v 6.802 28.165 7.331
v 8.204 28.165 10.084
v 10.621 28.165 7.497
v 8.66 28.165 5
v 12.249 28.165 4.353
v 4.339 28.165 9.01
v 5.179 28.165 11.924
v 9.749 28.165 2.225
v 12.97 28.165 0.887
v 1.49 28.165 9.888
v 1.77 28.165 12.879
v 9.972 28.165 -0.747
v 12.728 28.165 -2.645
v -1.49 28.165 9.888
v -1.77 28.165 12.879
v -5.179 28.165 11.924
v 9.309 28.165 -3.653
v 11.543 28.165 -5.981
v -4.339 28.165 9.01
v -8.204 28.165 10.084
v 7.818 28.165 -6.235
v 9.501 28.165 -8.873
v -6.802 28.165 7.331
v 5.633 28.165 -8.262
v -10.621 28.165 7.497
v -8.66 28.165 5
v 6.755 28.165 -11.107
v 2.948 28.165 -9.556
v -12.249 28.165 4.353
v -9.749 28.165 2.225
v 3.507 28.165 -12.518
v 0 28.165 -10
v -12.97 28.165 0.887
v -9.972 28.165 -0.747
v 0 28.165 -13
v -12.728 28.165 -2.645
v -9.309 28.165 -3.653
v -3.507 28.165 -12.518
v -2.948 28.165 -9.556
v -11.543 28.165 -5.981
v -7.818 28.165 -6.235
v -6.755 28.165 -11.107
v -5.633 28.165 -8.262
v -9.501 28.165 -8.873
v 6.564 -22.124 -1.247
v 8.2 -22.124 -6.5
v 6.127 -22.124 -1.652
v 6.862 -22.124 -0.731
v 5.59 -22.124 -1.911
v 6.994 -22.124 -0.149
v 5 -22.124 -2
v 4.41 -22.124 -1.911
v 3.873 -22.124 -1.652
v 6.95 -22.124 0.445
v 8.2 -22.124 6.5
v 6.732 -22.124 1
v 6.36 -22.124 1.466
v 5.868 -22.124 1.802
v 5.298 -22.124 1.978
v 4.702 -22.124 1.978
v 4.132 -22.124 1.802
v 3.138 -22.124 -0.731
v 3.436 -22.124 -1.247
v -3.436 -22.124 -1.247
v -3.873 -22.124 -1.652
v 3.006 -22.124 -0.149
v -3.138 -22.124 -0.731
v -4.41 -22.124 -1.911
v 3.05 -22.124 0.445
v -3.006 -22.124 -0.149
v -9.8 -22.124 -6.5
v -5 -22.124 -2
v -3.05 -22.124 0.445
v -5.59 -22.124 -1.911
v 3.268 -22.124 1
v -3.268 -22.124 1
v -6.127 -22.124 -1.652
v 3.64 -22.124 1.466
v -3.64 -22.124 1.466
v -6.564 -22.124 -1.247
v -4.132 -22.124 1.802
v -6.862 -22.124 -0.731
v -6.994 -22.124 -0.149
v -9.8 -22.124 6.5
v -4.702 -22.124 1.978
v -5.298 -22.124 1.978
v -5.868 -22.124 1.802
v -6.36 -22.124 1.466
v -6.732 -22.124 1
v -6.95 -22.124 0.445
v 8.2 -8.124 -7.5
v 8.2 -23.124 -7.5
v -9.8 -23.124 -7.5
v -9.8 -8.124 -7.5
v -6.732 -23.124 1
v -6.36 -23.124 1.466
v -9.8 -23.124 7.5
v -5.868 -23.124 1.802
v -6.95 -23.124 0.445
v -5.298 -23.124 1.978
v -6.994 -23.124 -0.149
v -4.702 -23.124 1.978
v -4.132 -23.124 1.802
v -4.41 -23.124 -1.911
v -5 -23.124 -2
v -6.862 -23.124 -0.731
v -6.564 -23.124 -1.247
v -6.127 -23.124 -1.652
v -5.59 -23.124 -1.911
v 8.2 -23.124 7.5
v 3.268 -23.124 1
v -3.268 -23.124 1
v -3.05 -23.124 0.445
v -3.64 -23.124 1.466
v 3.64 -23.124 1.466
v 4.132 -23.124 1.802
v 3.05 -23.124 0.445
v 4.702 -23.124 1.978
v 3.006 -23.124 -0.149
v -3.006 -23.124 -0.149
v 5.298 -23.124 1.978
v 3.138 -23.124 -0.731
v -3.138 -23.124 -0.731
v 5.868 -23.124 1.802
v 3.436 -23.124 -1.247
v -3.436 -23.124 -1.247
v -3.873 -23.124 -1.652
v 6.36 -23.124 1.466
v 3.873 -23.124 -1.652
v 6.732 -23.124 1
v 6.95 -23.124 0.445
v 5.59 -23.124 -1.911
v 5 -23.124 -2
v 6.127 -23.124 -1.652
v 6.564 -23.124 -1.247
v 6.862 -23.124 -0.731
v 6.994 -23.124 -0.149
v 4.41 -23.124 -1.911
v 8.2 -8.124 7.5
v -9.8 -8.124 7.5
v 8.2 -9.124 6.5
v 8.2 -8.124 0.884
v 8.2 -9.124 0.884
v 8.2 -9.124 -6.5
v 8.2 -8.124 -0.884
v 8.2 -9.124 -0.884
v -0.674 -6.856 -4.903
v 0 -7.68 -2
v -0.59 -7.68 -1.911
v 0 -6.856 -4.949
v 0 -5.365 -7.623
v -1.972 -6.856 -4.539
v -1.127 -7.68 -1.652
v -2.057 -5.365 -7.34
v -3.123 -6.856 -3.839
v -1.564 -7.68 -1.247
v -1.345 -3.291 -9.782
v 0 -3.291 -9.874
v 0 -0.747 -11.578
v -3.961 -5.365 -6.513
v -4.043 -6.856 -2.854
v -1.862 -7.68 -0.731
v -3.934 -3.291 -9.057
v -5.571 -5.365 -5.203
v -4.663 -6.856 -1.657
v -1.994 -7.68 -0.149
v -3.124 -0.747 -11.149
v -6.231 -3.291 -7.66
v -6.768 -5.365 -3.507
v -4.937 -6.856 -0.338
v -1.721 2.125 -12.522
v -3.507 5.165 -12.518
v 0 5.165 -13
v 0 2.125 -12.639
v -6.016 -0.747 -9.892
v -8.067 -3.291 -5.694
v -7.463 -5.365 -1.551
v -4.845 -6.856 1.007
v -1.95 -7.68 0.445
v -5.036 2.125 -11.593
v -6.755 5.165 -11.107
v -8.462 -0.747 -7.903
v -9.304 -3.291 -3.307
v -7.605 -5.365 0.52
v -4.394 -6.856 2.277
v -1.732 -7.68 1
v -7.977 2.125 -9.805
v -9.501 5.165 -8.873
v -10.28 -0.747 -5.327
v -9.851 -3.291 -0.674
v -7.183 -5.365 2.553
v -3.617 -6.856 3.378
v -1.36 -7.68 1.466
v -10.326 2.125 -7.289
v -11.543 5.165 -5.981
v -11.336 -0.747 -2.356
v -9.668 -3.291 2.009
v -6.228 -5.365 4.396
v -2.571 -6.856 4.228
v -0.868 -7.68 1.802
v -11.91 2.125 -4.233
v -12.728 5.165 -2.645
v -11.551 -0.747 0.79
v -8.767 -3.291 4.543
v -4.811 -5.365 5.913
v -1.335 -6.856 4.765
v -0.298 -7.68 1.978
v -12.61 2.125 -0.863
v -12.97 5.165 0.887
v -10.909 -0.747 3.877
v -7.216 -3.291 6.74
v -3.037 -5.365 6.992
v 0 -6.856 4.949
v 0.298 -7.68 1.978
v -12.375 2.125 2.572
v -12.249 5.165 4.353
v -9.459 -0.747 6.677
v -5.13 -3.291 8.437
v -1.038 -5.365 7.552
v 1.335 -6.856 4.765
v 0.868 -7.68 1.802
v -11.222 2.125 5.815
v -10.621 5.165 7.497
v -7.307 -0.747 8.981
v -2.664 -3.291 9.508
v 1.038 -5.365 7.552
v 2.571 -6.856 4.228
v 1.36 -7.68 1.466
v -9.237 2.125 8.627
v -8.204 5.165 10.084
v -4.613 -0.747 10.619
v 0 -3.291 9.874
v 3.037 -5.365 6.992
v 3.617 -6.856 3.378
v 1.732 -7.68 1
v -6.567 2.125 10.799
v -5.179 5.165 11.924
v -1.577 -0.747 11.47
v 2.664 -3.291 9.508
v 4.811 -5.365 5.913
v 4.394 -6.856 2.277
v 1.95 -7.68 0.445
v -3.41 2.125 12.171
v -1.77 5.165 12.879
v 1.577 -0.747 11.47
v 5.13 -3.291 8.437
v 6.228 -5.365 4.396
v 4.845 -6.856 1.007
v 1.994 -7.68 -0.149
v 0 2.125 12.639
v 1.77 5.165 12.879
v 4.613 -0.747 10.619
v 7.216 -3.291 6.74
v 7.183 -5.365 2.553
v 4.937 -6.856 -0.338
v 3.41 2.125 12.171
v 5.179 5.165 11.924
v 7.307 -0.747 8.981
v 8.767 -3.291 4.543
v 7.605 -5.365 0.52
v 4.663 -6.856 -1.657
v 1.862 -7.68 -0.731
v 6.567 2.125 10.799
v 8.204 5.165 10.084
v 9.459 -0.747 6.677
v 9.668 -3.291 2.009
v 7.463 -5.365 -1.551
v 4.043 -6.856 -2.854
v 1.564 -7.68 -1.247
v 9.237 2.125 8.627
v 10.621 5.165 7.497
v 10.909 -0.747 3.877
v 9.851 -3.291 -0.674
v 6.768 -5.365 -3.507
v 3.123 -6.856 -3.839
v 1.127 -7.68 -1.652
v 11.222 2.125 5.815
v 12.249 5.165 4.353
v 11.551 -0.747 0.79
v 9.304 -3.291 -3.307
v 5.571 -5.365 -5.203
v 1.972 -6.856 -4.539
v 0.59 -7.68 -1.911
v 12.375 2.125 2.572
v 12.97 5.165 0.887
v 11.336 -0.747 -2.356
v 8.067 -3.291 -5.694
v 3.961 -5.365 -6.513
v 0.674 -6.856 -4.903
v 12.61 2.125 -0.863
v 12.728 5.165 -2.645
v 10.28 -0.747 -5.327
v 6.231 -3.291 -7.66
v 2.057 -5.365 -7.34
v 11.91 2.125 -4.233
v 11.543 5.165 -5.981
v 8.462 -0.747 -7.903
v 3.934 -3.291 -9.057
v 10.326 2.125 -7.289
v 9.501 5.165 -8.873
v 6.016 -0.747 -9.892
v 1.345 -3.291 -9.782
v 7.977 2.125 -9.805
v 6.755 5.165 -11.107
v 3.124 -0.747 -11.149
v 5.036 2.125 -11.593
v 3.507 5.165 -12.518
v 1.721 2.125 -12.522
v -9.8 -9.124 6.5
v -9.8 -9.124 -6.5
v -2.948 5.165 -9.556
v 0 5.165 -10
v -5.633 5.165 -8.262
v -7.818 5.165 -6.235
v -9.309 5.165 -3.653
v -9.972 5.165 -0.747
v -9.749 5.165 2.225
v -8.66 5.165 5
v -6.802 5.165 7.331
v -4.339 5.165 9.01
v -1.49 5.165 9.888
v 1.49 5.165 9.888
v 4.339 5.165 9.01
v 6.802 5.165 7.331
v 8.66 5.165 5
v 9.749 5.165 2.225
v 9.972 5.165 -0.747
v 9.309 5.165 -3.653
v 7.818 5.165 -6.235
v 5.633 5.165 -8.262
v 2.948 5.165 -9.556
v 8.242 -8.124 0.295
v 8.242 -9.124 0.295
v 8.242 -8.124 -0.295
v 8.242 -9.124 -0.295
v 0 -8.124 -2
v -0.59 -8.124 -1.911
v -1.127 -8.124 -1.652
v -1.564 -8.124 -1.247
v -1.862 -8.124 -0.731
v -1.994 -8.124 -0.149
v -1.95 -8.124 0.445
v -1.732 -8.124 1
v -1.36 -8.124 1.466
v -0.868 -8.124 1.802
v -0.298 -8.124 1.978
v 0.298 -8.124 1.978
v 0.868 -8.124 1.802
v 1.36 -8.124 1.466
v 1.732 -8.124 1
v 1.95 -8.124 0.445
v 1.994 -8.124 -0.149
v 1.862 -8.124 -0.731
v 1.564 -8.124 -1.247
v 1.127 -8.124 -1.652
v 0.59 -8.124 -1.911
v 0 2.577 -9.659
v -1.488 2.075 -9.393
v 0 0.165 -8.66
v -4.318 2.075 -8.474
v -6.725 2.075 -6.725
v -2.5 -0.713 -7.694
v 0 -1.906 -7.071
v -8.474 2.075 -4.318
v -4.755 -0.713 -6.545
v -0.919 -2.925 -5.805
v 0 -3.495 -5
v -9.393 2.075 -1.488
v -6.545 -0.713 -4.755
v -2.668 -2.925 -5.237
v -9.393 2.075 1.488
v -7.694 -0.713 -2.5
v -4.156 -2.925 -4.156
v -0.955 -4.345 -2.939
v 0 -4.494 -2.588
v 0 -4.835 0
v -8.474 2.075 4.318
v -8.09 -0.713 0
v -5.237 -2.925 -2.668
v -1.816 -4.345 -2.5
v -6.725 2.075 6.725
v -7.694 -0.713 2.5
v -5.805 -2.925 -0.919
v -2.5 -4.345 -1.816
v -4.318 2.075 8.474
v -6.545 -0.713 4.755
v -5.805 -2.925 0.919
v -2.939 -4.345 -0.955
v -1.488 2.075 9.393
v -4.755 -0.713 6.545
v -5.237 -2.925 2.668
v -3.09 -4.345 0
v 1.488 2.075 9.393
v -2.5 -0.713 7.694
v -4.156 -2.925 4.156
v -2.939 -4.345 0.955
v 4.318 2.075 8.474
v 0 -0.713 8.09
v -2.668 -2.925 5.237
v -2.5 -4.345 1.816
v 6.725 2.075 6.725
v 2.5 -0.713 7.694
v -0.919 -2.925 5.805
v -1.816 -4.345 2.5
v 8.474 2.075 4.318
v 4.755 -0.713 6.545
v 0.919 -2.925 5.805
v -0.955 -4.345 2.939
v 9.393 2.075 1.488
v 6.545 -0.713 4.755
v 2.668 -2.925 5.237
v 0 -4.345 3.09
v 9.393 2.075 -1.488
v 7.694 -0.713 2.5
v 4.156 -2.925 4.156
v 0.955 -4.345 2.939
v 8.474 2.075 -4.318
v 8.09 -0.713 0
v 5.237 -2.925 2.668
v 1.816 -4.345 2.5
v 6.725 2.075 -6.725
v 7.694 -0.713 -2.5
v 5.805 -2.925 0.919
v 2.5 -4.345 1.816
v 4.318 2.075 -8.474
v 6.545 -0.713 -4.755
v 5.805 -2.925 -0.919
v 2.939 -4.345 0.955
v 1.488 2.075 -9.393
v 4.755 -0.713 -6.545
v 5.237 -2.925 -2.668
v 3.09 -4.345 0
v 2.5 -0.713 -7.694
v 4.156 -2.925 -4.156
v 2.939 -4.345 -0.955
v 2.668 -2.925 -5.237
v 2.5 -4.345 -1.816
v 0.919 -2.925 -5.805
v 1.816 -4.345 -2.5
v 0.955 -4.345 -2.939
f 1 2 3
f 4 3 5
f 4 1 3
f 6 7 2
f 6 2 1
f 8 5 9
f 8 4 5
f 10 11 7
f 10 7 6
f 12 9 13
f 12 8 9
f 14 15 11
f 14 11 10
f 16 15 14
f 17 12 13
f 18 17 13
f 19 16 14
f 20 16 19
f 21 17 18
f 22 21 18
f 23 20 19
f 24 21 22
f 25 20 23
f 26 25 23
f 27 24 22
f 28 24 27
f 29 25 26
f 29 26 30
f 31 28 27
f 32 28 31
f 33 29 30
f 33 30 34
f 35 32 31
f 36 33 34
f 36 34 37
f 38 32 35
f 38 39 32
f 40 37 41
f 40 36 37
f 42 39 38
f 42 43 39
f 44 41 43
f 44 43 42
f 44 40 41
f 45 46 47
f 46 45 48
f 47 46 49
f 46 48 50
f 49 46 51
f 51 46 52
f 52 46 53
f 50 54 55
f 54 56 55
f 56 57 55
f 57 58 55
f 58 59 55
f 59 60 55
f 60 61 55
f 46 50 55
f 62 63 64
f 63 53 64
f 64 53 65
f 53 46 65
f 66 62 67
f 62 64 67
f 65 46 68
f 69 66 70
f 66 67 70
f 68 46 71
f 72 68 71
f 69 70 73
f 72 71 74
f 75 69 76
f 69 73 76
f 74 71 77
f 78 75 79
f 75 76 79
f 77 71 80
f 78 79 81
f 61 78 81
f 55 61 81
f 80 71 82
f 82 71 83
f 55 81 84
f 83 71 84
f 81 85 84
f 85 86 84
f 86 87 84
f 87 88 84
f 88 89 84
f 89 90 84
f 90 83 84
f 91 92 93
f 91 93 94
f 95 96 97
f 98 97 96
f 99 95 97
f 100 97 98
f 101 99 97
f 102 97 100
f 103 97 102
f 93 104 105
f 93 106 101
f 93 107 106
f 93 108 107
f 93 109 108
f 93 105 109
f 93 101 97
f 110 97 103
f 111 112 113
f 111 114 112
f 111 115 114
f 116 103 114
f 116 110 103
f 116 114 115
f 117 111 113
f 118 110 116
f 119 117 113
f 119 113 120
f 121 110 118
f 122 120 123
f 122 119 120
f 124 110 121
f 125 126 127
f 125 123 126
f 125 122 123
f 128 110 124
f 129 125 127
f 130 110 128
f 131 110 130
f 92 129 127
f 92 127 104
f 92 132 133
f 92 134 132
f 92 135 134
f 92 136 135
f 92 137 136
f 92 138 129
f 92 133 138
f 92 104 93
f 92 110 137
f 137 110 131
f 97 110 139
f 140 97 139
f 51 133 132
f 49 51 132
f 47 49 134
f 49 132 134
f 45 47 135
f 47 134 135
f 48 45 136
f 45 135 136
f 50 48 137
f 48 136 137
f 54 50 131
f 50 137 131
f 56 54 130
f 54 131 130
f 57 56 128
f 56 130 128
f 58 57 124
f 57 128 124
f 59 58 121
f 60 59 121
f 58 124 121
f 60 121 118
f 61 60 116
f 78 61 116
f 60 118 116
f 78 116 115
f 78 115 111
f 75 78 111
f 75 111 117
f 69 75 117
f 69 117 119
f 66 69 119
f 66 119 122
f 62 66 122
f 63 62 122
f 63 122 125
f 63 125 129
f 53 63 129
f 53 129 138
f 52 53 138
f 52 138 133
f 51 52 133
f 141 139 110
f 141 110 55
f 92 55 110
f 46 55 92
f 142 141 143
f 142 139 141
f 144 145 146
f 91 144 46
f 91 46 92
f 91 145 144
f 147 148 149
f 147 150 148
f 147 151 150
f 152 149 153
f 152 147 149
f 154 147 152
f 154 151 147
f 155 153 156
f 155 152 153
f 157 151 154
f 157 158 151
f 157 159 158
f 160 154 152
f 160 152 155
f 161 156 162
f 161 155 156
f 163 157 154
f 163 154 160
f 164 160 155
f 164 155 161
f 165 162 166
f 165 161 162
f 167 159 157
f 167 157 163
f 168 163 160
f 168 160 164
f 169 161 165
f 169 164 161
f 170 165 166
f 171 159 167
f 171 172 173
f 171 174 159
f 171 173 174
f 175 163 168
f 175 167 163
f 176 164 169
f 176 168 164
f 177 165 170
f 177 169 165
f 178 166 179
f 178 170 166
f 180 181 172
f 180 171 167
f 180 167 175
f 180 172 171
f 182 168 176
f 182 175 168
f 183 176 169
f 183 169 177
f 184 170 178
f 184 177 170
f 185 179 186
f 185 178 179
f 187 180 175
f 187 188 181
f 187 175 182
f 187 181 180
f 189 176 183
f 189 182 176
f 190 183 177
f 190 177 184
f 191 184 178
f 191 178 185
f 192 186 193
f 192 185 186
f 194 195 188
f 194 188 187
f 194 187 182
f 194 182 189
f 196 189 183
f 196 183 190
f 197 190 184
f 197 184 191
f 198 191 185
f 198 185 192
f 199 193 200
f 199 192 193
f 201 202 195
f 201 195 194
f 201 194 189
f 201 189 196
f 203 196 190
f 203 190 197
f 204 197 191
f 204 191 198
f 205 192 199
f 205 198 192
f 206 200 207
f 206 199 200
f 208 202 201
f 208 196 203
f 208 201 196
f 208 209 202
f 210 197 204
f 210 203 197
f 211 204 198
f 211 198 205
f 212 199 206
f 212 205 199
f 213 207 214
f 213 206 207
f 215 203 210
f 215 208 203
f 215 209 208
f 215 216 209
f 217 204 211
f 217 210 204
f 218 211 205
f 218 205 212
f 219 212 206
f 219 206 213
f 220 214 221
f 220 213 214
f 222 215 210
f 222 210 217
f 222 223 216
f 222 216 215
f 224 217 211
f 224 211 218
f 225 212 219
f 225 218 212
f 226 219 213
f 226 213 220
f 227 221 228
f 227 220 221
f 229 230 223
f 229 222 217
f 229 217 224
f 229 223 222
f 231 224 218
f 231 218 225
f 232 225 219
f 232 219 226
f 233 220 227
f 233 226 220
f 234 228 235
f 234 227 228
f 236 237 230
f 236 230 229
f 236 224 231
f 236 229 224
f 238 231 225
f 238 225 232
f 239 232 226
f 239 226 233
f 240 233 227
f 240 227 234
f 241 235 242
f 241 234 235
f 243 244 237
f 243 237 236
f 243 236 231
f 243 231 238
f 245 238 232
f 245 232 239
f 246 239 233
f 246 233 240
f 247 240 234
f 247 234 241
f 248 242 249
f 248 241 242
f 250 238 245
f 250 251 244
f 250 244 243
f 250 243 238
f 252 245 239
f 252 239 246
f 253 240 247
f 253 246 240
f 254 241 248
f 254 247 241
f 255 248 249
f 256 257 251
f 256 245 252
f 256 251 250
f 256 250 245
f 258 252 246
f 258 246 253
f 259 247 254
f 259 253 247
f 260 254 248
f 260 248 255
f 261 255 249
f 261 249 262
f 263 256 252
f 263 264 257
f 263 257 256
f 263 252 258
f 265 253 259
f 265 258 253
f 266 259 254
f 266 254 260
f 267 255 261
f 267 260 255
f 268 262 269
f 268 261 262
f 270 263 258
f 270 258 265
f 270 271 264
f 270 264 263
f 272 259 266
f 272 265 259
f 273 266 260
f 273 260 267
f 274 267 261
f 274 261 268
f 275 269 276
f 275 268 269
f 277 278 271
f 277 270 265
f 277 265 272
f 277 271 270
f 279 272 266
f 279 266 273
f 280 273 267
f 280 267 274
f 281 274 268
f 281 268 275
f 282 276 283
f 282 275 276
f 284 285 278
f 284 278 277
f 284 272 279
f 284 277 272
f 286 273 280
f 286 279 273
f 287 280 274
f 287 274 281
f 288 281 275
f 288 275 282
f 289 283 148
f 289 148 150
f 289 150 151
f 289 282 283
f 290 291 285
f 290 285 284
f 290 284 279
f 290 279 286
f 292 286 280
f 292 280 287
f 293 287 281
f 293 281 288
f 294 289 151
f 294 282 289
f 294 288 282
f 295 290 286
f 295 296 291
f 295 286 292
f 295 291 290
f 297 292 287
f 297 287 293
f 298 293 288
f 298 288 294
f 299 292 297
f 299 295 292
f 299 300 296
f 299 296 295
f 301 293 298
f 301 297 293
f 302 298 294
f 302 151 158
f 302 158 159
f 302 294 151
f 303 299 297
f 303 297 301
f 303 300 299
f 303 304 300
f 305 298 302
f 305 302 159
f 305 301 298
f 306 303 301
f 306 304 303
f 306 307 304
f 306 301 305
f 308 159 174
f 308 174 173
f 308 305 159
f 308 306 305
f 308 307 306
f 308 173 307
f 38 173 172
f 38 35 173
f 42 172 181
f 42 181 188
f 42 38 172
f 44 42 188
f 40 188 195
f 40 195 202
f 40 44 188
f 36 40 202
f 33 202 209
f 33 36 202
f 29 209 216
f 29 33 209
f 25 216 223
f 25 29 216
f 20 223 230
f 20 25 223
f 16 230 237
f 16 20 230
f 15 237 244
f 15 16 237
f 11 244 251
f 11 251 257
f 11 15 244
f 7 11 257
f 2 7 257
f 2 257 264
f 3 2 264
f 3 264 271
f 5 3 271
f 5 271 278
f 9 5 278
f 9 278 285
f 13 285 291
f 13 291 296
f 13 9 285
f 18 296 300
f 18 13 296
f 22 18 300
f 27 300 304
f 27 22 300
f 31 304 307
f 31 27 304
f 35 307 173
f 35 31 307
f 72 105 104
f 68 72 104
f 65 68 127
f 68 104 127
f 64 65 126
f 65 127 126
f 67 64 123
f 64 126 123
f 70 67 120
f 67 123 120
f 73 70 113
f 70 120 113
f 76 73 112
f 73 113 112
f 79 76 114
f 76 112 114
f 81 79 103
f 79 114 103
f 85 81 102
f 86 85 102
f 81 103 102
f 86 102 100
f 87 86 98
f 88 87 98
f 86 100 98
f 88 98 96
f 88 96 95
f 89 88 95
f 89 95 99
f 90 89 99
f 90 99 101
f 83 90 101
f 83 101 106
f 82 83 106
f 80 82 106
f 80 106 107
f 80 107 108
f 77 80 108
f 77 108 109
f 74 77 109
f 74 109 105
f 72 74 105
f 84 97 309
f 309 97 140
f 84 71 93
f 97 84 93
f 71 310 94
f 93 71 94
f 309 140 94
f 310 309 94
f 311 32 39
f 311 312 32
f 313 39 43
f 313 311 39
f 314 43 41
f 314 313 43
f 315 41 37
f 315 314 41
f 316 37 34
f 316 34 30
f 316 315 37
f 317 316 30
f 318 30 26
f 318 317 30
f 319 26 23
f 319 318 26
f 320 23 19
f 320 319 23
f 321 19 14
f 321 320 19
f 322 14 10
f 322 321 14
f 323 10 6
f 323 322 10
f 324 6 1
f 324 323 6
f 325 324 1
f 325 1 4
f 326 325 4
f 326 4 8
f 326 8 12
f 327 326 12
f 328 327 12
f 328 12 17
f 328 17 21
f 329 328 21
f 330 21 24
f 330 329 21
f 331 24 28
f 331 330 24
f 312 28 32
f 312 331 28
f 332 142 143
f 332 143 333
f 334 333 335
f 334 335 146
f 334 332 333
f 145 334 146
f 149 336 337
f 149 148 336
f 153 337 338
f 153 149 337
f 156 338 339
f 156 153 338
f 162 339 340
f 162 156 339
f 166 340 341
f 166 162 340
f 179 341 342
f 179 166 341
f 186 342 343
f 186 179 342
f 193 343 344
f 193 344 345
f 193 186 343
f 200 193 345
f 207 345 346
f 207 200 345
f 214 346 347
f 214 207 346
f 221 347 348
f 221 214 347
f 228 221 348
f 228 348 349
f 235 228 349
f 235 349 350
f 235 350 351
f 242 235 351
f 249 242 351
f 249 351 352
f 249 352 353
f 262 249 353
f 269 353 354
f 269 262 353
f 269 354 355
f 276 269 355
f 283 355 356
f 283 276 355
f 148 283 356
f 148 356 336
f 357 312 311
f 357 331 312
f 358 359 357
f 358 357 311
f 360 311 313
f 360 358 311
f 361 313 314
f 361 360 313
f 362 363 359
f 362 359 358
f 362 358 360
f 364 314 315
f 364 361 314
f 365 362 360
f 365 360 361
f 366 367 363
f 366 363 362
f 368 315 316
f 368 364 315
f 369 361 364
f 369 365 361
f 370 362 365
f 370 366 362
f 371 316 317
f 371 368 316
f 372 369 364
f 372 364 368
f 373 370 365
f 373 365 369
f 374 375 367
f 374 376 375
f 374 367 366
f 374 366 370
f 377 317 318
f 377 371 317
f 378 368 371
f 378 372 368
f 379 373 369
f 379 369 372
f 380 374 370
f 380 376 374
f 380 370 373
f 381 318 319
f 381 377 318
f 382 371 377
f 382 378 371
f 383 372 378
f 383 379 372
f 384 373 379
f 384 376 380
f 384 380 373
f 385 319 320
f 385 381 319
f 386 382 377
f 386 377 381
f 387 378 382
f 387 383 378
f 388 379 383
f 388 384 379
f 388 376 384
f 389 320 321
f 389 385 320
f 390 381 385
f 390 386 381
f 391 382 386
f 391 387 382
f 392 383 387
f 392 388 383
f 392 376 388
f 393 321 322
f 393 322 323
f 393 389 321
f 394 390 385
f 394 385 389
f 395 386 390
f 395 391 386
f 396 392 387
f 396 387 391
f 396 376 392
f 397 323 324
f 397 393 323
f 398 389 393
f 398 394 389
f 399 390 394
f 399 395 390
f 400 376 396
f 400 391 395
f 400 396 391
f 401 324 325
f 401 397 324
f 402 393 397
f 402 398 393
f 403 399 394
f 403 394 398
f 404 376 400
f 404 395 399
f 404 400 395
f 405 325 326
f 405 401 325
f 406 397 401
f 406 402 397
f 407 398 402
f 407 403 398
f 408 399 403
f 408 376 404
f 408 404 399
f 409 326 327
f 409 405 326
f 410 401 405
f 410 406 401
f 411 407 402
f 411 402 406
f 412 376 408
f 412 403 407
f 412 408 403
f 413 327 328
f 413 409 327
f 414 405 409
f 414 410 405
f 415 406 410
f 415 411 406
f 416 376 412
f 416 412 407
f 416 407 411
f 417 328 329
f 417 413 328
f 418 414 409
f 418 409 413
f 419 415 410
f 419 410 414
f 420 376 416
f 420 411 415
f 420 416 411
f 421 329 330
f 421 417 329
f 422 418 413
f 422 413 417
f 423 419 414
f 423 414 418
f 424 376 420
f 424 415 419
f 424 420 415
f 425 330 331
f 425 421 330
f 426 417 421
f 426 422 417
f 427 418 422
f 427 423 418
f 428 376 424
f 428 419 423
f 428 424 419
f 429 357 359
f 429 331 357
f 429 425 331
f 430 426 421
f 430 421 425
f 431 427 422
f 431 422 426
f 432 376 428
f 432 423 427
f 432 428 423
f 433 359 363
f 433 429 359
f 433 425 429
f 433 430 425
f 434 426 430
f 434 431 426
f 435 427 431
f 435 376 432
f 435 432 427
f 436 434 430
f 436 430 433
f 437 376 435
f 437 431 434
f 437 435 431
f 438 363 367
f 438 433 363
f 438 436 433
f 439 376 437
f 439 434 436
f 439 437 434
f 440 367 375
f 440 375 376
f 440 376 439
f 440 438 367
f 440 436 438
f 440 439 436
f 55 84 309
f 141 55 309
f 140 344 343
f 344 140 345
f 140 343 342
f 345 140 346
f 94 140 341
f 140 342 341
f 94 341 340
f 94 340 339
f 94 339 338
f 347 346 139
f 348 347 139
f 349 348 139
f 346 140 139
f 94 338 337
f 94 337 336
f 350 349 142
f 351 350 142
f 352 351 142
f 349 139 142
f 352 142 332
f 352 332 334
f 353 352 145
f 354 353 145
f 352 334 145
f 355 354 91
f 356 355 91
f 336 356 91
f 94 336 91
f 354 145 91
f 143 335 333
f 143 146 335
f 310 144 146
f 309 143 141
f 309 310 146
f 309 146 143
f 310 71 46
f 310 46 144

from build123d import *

# Parameters (mm, degrees)
SKETCH2_W           = 16.400211148
SKETCH2_H           = 13
BOSS_EXTRUDE1_DEPTH = 3
SKETCH3_W           = 16.430845556
SKETCH3_H           = 2.401527161
SKETCH3_H_2         = 2.320561052
CUT_EXTRUDE1_DEPTH  = 3
SKETCH4_R           = 2
CUT_EXTRUDE2_DEPTH  = 3
SKETCH5_W           = 15
SKETCH5_H           = 15
BOSS_EXTRUDE3_DEPTH = 18
SKETCH6_W           = 13
SKETCH6_H           = 13
CUT_EXTRUDE3_DEPTH  = 20
SKETCH7_R           = 2
CUT_EXTRUDE4_DEPTH  = 5


with BuildPart() as part:
    # Sketch1 → Revolve1 (revolve)
    with BuildSketch(Plane.XY, mode=Mode.PRIVATE) as revolve1_sk:
        with BuildLine():
            Line((10, 25.165087569), (10, 5.165087569))
            ThreePointArc((10, 5.165087569), (7.071067812, -1.905980243), (0, -4.834912431))
            Line((0, -4.834912431), (0, -9.834912431))
            Line((0, -9.834912431), (0, -11.124312847))
            Line((0, -11.124312847), (8.247604153, -11.124312847))
            Line((8.247604153, -11.124312847), (8.247604153, -8.124312847))
            Line((8.247604153, -8.124312847), (2, -8.124312847))
            Line((2, -8.124312847), (2, -7.680145009))
            ThreePointArc((2, -7.680145009), (9.874208829, -3.290679693), (13, 5.165087569))
            Line((13, 5.165087569), (13, 28.165087569))
            Line((13, 28.165087569), (10, 28.165087569))
            Line((10, 28.165087569), (10, 25.165087569))
        make_face()
    revolve(revolve1_sk.sketch.rotate(Axis((0, 0, 0), (0, 1, 0)), 90), axis=Axis((0, 0, 0), (0, 1, 0)))

    # Sketch2 → Boss-Extrude1 (add)
    with BuildSketch(Plane.XZ.offset(11.124312847)):
        Rectangle(SKETCH2_W, SKETCH2_H)
    extrude(amount=-BOSS_EXTRUDE1_DEPTH)

    # Sketch3 → Cut-Extrude1 (cut)
    with BuildSketch(Plane.XZ.offset(11.124312847)):
        with Locations((0.015317204, 7.700763581)):
            Rectangle(SKETCH3_W, SKETCH3_H)
        with Locations((0.015317204, -7.704987868)):
            Rectangle(SKETCH3_W, SKETCH3_H_2)
    extrude(amount=-CUT_EXTRUDE1_DEPTH, mode=Mode.SUBTRACT)

    # Sketch4 → Cut-Extrude2 (cut)
    with BuildSketch(Plane.XZ.offset(11.124312847)):
        with Locations(Location((5, 0, 0), (0, 0, 270))):
            Circle(SKETCH4_R)
        with Locations(Location((-5, 0, 0), (0, 0, 270))):
            Circle(SKETCH4_R)
    extrude(amount=-CUT_EXTRUDE2_DEPTH, mode=Mode.SUBTRACT)

    # Sketch5 → Boss-Extrude3 (add)
    with BuildSketch(Plane(origin=(8.200105574, 0, 0), x_dir=(0, 0, -1), z_dir=(1, 0, 0))):
        with Locations((0, -15.624312847)):
            Rectangle(SKETCH5_W, SKETCH5_H)
    extrude(amount=-BOSS_EXTRUDE3_DEPTH)

    # Sketch6 → Cut-Extrude3 (cut)
    with BuildSketch(Plane.ZY.offset(9.799894426)):
        with Locations((0, -15.624312847)):
            Rectangle(SKETCH6_W, SKETCH6_H)
    extrude(amount=-CUT_EXTRUDE3_DEPTH, mode=Mode.SUBTRACT)

    # Sketch7 → Cut-Extrude4 (cut)
    with BuildSketch(Plane.XZ.offset(23.124312847)):
        with Locations(Location((-5, 0, 0), (0, 0, 270))):
            Circle(SKETCH7_R)
        with Locations(Location((5, 0, 0), (0, 0, 270))):
            Circle(SKETCH7_R)
    extrude(amount=-CUT_EXTRUDE4_DEPTH, mode=Mode.SUBTRACT)


solid = part.part
